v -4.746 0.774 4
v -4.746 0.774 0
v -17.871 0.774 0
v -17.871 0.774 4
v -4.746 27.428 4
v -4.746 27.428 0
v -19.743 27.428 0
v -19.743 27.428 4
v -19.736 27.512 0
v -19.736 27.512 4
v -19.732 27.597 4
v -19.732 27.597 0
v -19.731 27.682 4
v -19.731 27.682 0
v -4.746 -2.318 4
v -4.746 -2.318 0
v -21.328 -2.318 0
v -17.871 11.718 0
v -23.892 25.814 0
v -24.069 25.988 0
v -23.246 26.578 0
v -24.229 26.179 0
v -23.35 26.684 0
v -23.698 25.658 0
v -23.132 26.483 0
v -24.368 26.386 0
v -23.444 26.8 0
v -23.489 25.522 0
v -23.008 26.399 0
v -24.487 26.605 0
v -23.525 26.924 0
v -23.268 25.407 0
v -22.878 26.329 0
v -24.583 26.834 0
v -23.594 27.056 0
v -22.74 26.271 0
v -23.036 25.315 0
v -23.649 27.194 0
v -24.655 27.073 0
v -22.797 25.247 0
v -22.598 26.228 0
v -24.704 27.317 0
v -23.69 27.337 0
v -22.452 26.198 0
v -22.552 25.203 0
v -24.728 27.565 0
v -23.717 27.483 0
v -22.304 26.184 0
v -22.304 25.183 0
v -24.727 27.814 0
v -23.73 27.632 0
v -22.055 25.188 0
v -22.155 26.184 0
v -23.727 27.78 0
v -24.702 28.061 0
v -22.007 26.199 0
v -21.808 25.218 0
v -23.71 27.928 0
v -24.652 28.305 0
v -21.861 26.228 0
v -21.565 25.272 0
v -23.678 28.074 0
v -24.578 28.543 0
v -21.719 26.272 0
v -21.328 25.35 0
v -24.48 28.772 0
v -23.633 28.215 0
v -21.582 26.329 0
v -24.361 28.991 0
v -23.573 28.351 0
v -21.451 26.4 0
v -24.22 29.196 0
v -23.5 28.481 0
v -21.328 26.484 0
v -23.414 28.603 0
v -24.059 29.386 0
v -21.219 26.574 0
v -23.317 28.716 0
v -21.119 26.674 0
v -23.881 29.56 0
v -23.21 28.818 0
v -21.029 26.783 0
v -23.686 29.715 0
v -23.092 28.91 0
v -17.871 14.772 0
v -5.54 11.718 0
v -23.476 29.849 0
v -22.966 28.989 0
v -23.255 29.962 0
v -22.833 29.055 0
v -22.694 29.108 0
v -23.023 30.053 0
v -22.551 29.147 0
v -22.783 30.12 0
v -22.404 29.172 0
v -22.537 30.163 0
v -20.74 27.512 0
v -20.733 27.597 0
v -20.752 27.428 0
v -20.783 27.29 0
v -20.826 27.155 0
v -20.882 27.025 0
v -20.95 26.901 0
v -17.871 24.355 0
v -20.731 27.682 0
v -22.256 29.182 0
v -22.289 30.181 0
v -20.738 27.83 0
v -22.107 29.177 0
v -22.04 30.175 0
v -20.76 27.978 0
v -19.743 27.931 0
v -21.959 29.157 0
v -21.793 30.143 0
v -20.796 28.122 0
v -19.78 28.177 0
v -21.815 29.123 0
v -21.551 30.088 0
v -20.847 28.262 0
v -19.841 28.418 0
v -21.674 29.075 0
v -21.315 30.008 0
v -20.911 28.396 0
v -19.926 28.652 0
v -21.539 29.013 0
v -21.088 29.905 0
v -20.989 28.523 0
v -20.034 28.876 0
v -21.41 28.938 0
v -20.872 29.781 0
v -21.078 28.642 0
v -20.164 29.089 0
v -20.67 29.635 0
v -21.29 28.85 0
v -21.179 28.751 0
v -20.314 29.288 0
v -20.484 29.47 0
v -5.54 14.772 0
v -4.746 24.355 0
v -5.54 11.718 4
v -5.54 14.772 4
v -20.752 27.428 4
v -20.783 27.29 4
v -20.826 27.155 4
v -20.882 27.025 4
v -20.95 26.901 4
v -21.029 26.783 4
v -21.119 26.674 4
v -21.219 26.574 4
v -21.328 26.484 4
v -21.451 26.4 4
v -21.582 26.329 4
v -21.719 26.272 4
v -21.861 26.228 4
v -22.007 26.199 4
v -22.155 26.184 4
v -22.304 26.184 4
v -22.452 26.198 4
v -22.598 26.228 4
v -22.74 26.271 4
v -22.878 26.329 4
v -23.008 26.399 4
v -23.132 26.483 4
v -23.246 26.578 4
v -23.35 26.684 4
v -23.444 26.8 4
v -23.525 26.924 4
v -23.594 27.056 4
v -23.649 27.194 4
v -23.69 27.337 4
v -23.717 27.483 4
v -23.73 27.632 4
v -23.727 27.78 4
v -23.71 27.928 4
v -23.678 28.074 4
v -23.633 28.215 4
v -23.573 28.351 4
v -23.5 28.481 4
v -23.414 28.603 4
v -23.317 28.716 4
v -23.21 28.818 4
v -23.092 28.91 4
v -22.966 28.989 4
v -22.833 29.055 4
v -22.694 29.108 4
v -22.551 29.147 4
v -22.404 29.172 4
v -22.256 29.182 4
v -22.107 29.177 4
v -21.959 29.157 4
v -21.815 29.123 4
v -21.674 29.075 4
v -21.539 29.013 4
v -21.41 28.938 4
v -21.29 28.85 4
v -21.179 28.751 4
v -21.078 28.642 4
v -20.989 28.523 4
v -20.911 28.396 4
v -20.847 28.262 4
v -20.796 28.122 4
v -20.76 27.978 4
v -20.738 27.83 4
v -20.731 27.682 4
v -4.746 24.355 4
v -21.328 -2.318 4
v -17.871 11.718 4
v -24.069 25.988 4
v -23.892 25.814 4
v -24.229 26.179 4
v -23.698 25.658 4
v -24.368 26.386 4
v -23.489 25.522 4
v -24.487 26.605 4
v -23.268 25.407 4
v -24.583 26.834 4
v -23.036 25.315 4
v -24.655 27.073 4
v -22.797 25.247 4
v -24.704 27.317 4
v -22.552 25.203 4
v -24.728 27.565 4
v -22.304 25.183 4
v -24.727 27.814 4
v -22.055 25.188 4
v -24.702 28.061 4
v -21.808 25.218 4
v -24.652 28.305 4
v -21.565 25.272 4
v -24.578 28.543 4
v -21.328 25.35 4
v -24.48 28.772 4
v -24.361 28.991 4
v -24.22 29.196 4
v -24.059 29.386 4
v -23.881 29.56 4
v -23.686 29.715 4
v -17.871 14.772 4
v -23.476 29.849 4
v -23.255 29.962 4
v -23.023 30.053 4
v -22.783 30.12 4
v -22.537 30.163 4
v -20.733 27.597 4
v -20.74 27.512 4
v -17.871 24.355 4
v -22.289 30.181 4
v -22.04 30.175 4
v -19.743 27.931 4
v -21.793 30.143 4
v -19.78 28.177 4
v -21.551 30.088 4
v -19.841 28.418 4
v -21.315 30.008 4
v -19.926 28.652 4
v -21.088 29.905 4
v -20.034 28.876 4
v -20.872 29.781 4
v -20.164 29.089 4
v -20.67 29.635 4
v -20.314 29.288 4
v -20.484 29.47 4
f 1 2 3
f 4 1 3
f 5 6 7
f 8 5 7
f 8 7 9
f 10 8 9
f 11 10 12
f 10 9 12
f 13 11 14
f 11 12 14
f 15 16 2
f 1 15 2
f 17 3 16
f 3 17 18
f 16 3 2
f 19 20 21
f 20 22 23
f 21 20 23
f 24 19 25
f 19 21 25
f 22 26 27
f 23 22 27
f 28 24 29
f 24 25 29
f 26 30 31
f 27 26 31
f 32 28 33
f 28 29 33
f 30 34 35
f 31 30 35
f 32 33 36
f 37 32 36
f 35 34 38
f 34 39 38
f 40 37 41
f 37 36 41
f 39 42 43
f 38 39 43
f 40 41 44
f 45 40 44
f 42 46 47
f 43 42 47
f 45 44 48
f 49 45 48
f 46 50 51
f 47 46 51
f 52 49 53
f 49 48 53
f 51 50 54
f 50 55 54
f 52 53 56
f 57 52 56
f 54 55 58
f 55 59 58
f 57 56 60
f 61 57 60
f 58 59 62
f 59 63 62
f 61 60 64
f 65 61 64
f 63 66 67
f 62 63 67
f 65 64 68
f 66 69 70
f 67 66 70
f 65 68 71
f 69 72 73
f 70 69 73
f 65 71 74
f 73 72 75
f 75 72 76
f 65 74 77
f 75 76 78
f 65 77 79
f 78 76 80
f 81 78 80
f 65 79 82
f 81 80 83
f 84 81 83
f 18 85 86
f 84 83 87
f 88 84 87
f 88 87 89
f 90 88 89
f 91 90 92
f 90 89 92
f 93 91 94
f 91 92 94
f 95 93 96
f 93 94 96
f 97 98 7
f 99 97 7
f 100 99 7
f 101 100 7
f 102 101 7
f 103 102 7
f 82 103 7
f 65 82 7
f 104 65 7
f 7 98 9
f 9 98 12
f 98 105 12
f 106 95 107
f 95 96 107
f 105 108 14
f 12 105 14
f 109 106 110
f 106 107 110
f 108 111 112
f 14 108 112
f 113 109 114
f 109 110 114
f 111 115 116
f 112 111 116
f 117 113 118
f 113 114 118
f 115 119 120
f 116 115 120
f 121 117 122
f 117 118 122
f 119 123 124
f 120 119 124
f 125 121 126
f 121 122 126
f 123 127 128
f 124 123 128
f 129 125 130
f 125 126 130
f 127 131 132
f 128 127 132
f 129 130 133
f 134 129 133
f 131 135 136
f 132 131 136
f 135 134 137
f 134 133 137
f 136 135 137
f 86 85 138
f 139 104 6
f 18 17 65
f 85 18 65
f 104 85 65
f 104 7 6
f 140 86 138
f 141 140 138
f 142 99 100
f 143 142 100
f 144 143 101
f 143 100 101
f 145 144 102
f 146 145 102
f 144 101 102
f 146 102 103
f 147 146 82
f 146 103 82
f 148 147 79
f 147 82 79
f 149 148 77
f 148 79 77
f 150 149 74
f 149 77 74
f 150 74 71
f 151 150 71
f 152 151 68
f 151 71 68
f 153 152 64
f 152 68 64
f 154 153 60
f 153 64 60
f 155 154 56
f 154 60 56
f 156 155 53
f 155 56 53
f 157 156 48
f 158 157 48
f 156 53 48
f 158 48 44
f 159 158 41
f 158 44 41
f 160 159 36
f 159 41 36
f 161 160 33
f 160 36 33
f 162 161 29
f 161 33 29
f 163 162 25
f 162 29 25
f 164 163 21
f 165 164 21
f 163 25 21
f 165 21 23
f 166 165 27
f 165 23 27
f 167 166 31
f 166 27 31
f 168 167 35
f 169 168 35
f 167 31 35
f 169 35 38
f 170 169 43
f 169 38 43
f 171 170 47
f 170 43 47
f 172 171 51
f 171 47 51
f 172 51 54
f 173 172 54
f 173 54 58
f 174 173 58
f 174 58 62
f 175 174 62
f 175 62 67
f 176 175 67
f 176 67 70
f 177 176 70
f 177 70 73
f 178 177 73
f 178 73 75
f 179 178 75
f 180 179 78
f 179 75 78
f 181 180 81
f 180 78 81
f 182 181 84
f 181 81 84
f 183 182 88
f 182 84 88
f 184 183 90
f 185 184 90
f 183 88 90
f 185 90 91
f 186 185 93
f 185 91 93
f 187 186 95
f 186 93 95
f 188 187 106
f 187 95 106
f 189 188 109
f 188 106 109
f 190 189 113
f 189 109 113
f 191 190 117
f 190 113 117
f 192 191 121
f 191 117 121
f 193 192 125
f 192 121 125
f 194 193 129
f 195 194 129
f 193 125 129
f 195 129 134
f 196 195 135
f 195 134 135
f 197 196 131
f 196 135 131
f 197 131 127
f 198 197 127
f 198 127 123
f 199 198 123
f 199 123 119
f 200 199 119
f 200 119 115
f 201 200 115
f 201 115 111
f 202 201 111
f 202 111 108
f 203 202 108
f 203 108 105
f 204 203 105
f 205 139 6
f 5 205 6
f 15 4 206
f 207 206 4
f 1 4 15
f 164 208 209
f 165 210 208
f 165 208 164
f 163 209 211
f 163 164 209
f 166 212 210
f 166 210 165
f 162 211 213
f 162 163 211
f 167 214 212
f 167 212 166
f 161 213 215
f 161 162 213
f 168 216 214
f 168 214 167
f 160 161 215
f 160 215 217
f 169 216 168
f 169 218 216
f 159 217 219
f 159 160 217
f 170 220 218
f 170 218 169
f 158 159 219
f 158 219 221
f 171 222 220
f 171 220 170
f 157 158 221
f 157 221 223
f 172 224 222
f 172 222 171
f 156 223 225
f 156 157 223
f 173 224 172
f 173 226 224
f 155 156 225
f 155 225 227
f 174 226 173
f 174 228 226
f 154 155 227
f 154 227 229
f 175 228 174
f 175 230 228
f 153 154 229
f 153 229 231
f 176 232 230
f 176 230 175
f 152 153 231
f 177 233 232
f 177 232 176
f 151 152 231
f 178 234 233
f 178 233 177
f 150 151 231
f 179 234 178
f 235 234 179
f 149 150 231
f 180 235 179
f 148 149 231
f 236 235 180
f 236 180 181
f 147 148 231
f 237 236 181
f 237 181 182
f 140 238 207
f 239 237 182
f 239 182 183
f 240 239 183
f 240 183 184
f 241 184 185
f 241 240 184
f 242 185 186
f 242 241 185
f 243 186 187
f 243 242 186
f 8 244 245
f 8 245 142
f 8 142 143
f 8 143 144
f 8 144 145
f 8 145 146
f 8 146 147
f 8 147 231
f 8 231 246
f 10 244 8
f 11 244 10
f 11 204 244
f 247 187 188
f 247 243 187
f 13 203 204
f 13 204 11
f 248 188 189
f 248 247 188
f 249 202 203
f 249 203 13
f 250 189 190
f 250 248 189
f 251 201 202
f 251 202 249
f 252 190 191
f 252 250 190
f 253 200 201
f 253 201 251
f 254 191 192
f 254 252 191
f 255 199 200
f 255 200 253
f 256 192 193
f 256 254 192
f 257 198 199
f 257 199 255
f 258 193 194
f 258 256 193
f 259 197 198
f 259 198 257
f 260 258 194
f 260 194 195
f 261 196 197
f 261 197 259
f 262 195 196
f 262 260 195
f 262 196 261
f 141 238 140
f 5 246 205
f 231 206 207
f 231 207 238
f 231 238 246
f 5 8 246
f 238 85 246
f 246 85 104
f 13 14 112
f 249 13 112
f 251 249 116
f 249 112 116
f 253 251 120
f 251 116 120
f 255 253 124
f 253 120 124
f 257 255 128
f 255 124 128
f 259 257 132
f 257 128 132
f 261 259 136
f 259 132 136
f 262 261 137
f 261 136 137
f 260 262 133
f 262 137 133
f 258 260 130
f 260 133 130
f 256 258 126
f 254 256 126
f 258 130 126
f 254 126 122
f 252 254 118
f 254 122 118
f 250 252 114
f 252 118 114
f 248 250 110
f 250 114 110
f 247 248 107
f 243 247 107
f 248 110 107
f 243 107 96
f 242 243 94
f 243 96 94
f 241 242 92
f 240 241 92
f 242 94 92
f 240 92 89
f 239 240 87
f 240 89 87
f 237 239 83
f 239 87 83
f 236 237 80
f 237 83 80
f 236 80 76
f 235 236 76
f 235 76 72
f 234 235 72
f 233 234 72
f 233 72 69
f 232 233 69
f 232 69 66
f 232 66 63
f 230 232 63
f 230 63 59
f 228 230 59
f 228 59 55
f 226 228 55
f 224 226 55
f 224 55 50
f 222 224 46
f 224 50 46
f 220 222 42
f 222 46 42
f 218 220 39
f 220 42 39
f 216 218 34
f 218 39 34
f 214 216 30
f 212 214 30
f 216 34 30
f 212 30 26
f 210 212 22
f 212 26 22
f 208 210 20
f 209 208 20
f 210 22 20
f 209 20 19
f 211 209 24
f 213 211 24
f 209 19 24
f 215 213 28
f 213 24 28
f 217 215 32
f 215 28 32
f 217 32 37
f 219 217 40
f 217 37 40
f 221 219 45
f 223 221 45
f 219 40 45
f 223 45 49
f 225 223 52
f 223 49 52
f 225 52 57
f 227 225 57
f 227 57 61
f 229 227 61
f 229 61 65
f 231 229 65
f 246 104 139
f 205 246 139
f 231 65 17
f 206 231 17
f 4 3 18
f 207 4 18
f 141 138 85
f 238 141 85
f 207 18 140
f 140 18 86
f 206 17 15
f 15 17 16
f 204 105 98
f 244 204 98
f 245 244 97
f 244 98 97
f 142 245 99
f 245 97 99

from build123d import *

# Parameters (mm, degrees)
F1_DEPTH = 4


with BuildPart() as f1:
    # F0 (on Top) → F1 (new body)
    with BuildSketch(Plane.XY):
        with BuildLine():
            ThreePointArc((-21.3281772584, 26.4835794998), (-23.5728167331, 28.3513270209), (-20.7305210084, 27.6818181058))
            ThreePointArc((-20.7305210084, 27.6818181058), (-20.7359422147, 27.5544044904), (-20.7521666475, 27.4279118558))
            Line((-20.7521666475, 27.4279118558), (-19.7434481071, 27.4279118558))
            ThreePointArc((-19.7434481071, 27.4279118558), (-19.7337548746, 27.5547005483), (-19.7305210084, 27.6818181058))
            ThreePointArc((-19.7305210084, 27.6818181058), (-24.2927842524, 29.0949954876), (-21.3281772584, 25.3503430883))
            Line((-21.3281772584, 25.3503430883), (-21.3281772584, 26.4835794998))
        make_face()
        with BuildLine():
            ThreePointArc((-20.7521666475, 27.4279118558), (-20.949946226, 26.9007110538), (-21.3281772584, 26.4835794998))
            Line((-21.3281772584, 26.4835794998), (-21.3281772584, 25.3503430883))
            ThreePointArc((-21.3281772584, 25.3503430883), (-20.2427812606, 26.165608788), (-19.7434481071, 27.4279118558))
            Line((-19.7434481071, 27.4279118558), (-20.7521666475, 27.4279118558))
        make_face()
        with BuildLine():
            ThreePointArc((-19.7434481071, 27.4279118558), (-20.2427812606, 26.165608788), (-21.3281772584, 25.3503430883))
            Line((-21.3281772584, 25.3503430883), (-21.3281772584, -2.3181818942))
            Line((-21.3281772584, -2.3181818942), (-4.7461460084, -2.3181818942))
            Line((-4.7461460084, -2.3181818942), (-4.7461460084, 0.7742660224))
            Line((-4.7461460084, 0.7742660224), (-17.8711460084, 0.7742660224))
            Line((-17.8711460084, 0.7742660224), (-17.8711460084, 11.7182764391))
            Line((-17.8711460084, 11.7182764391), (-5.5404168417, 11.7182764391))
            Line((-5.5404168417, 11.7182764391), (-5.5404168417, 14.7716618558))
            Line((-5.5404168417, 14.7716618558), (-17.8711460084, 14.7716618558))
            Line((-17.8711460084, 14.7716618558), (-17.8711460084, 24.3549951891))
            Line((-17.8711460084, 24.3549951891), (-4.7461460084, 24.3549951891))
            Line((-4.7461460084, 24.3549951891), (-4.7461460084, 27.4279118558))
            Line((-4.7461460084, 27.4279118558), (-19.7434481071, 27.4279118558))
        make_face()
    extrude(amount=F1_DEPTH)


solid = f1.part
